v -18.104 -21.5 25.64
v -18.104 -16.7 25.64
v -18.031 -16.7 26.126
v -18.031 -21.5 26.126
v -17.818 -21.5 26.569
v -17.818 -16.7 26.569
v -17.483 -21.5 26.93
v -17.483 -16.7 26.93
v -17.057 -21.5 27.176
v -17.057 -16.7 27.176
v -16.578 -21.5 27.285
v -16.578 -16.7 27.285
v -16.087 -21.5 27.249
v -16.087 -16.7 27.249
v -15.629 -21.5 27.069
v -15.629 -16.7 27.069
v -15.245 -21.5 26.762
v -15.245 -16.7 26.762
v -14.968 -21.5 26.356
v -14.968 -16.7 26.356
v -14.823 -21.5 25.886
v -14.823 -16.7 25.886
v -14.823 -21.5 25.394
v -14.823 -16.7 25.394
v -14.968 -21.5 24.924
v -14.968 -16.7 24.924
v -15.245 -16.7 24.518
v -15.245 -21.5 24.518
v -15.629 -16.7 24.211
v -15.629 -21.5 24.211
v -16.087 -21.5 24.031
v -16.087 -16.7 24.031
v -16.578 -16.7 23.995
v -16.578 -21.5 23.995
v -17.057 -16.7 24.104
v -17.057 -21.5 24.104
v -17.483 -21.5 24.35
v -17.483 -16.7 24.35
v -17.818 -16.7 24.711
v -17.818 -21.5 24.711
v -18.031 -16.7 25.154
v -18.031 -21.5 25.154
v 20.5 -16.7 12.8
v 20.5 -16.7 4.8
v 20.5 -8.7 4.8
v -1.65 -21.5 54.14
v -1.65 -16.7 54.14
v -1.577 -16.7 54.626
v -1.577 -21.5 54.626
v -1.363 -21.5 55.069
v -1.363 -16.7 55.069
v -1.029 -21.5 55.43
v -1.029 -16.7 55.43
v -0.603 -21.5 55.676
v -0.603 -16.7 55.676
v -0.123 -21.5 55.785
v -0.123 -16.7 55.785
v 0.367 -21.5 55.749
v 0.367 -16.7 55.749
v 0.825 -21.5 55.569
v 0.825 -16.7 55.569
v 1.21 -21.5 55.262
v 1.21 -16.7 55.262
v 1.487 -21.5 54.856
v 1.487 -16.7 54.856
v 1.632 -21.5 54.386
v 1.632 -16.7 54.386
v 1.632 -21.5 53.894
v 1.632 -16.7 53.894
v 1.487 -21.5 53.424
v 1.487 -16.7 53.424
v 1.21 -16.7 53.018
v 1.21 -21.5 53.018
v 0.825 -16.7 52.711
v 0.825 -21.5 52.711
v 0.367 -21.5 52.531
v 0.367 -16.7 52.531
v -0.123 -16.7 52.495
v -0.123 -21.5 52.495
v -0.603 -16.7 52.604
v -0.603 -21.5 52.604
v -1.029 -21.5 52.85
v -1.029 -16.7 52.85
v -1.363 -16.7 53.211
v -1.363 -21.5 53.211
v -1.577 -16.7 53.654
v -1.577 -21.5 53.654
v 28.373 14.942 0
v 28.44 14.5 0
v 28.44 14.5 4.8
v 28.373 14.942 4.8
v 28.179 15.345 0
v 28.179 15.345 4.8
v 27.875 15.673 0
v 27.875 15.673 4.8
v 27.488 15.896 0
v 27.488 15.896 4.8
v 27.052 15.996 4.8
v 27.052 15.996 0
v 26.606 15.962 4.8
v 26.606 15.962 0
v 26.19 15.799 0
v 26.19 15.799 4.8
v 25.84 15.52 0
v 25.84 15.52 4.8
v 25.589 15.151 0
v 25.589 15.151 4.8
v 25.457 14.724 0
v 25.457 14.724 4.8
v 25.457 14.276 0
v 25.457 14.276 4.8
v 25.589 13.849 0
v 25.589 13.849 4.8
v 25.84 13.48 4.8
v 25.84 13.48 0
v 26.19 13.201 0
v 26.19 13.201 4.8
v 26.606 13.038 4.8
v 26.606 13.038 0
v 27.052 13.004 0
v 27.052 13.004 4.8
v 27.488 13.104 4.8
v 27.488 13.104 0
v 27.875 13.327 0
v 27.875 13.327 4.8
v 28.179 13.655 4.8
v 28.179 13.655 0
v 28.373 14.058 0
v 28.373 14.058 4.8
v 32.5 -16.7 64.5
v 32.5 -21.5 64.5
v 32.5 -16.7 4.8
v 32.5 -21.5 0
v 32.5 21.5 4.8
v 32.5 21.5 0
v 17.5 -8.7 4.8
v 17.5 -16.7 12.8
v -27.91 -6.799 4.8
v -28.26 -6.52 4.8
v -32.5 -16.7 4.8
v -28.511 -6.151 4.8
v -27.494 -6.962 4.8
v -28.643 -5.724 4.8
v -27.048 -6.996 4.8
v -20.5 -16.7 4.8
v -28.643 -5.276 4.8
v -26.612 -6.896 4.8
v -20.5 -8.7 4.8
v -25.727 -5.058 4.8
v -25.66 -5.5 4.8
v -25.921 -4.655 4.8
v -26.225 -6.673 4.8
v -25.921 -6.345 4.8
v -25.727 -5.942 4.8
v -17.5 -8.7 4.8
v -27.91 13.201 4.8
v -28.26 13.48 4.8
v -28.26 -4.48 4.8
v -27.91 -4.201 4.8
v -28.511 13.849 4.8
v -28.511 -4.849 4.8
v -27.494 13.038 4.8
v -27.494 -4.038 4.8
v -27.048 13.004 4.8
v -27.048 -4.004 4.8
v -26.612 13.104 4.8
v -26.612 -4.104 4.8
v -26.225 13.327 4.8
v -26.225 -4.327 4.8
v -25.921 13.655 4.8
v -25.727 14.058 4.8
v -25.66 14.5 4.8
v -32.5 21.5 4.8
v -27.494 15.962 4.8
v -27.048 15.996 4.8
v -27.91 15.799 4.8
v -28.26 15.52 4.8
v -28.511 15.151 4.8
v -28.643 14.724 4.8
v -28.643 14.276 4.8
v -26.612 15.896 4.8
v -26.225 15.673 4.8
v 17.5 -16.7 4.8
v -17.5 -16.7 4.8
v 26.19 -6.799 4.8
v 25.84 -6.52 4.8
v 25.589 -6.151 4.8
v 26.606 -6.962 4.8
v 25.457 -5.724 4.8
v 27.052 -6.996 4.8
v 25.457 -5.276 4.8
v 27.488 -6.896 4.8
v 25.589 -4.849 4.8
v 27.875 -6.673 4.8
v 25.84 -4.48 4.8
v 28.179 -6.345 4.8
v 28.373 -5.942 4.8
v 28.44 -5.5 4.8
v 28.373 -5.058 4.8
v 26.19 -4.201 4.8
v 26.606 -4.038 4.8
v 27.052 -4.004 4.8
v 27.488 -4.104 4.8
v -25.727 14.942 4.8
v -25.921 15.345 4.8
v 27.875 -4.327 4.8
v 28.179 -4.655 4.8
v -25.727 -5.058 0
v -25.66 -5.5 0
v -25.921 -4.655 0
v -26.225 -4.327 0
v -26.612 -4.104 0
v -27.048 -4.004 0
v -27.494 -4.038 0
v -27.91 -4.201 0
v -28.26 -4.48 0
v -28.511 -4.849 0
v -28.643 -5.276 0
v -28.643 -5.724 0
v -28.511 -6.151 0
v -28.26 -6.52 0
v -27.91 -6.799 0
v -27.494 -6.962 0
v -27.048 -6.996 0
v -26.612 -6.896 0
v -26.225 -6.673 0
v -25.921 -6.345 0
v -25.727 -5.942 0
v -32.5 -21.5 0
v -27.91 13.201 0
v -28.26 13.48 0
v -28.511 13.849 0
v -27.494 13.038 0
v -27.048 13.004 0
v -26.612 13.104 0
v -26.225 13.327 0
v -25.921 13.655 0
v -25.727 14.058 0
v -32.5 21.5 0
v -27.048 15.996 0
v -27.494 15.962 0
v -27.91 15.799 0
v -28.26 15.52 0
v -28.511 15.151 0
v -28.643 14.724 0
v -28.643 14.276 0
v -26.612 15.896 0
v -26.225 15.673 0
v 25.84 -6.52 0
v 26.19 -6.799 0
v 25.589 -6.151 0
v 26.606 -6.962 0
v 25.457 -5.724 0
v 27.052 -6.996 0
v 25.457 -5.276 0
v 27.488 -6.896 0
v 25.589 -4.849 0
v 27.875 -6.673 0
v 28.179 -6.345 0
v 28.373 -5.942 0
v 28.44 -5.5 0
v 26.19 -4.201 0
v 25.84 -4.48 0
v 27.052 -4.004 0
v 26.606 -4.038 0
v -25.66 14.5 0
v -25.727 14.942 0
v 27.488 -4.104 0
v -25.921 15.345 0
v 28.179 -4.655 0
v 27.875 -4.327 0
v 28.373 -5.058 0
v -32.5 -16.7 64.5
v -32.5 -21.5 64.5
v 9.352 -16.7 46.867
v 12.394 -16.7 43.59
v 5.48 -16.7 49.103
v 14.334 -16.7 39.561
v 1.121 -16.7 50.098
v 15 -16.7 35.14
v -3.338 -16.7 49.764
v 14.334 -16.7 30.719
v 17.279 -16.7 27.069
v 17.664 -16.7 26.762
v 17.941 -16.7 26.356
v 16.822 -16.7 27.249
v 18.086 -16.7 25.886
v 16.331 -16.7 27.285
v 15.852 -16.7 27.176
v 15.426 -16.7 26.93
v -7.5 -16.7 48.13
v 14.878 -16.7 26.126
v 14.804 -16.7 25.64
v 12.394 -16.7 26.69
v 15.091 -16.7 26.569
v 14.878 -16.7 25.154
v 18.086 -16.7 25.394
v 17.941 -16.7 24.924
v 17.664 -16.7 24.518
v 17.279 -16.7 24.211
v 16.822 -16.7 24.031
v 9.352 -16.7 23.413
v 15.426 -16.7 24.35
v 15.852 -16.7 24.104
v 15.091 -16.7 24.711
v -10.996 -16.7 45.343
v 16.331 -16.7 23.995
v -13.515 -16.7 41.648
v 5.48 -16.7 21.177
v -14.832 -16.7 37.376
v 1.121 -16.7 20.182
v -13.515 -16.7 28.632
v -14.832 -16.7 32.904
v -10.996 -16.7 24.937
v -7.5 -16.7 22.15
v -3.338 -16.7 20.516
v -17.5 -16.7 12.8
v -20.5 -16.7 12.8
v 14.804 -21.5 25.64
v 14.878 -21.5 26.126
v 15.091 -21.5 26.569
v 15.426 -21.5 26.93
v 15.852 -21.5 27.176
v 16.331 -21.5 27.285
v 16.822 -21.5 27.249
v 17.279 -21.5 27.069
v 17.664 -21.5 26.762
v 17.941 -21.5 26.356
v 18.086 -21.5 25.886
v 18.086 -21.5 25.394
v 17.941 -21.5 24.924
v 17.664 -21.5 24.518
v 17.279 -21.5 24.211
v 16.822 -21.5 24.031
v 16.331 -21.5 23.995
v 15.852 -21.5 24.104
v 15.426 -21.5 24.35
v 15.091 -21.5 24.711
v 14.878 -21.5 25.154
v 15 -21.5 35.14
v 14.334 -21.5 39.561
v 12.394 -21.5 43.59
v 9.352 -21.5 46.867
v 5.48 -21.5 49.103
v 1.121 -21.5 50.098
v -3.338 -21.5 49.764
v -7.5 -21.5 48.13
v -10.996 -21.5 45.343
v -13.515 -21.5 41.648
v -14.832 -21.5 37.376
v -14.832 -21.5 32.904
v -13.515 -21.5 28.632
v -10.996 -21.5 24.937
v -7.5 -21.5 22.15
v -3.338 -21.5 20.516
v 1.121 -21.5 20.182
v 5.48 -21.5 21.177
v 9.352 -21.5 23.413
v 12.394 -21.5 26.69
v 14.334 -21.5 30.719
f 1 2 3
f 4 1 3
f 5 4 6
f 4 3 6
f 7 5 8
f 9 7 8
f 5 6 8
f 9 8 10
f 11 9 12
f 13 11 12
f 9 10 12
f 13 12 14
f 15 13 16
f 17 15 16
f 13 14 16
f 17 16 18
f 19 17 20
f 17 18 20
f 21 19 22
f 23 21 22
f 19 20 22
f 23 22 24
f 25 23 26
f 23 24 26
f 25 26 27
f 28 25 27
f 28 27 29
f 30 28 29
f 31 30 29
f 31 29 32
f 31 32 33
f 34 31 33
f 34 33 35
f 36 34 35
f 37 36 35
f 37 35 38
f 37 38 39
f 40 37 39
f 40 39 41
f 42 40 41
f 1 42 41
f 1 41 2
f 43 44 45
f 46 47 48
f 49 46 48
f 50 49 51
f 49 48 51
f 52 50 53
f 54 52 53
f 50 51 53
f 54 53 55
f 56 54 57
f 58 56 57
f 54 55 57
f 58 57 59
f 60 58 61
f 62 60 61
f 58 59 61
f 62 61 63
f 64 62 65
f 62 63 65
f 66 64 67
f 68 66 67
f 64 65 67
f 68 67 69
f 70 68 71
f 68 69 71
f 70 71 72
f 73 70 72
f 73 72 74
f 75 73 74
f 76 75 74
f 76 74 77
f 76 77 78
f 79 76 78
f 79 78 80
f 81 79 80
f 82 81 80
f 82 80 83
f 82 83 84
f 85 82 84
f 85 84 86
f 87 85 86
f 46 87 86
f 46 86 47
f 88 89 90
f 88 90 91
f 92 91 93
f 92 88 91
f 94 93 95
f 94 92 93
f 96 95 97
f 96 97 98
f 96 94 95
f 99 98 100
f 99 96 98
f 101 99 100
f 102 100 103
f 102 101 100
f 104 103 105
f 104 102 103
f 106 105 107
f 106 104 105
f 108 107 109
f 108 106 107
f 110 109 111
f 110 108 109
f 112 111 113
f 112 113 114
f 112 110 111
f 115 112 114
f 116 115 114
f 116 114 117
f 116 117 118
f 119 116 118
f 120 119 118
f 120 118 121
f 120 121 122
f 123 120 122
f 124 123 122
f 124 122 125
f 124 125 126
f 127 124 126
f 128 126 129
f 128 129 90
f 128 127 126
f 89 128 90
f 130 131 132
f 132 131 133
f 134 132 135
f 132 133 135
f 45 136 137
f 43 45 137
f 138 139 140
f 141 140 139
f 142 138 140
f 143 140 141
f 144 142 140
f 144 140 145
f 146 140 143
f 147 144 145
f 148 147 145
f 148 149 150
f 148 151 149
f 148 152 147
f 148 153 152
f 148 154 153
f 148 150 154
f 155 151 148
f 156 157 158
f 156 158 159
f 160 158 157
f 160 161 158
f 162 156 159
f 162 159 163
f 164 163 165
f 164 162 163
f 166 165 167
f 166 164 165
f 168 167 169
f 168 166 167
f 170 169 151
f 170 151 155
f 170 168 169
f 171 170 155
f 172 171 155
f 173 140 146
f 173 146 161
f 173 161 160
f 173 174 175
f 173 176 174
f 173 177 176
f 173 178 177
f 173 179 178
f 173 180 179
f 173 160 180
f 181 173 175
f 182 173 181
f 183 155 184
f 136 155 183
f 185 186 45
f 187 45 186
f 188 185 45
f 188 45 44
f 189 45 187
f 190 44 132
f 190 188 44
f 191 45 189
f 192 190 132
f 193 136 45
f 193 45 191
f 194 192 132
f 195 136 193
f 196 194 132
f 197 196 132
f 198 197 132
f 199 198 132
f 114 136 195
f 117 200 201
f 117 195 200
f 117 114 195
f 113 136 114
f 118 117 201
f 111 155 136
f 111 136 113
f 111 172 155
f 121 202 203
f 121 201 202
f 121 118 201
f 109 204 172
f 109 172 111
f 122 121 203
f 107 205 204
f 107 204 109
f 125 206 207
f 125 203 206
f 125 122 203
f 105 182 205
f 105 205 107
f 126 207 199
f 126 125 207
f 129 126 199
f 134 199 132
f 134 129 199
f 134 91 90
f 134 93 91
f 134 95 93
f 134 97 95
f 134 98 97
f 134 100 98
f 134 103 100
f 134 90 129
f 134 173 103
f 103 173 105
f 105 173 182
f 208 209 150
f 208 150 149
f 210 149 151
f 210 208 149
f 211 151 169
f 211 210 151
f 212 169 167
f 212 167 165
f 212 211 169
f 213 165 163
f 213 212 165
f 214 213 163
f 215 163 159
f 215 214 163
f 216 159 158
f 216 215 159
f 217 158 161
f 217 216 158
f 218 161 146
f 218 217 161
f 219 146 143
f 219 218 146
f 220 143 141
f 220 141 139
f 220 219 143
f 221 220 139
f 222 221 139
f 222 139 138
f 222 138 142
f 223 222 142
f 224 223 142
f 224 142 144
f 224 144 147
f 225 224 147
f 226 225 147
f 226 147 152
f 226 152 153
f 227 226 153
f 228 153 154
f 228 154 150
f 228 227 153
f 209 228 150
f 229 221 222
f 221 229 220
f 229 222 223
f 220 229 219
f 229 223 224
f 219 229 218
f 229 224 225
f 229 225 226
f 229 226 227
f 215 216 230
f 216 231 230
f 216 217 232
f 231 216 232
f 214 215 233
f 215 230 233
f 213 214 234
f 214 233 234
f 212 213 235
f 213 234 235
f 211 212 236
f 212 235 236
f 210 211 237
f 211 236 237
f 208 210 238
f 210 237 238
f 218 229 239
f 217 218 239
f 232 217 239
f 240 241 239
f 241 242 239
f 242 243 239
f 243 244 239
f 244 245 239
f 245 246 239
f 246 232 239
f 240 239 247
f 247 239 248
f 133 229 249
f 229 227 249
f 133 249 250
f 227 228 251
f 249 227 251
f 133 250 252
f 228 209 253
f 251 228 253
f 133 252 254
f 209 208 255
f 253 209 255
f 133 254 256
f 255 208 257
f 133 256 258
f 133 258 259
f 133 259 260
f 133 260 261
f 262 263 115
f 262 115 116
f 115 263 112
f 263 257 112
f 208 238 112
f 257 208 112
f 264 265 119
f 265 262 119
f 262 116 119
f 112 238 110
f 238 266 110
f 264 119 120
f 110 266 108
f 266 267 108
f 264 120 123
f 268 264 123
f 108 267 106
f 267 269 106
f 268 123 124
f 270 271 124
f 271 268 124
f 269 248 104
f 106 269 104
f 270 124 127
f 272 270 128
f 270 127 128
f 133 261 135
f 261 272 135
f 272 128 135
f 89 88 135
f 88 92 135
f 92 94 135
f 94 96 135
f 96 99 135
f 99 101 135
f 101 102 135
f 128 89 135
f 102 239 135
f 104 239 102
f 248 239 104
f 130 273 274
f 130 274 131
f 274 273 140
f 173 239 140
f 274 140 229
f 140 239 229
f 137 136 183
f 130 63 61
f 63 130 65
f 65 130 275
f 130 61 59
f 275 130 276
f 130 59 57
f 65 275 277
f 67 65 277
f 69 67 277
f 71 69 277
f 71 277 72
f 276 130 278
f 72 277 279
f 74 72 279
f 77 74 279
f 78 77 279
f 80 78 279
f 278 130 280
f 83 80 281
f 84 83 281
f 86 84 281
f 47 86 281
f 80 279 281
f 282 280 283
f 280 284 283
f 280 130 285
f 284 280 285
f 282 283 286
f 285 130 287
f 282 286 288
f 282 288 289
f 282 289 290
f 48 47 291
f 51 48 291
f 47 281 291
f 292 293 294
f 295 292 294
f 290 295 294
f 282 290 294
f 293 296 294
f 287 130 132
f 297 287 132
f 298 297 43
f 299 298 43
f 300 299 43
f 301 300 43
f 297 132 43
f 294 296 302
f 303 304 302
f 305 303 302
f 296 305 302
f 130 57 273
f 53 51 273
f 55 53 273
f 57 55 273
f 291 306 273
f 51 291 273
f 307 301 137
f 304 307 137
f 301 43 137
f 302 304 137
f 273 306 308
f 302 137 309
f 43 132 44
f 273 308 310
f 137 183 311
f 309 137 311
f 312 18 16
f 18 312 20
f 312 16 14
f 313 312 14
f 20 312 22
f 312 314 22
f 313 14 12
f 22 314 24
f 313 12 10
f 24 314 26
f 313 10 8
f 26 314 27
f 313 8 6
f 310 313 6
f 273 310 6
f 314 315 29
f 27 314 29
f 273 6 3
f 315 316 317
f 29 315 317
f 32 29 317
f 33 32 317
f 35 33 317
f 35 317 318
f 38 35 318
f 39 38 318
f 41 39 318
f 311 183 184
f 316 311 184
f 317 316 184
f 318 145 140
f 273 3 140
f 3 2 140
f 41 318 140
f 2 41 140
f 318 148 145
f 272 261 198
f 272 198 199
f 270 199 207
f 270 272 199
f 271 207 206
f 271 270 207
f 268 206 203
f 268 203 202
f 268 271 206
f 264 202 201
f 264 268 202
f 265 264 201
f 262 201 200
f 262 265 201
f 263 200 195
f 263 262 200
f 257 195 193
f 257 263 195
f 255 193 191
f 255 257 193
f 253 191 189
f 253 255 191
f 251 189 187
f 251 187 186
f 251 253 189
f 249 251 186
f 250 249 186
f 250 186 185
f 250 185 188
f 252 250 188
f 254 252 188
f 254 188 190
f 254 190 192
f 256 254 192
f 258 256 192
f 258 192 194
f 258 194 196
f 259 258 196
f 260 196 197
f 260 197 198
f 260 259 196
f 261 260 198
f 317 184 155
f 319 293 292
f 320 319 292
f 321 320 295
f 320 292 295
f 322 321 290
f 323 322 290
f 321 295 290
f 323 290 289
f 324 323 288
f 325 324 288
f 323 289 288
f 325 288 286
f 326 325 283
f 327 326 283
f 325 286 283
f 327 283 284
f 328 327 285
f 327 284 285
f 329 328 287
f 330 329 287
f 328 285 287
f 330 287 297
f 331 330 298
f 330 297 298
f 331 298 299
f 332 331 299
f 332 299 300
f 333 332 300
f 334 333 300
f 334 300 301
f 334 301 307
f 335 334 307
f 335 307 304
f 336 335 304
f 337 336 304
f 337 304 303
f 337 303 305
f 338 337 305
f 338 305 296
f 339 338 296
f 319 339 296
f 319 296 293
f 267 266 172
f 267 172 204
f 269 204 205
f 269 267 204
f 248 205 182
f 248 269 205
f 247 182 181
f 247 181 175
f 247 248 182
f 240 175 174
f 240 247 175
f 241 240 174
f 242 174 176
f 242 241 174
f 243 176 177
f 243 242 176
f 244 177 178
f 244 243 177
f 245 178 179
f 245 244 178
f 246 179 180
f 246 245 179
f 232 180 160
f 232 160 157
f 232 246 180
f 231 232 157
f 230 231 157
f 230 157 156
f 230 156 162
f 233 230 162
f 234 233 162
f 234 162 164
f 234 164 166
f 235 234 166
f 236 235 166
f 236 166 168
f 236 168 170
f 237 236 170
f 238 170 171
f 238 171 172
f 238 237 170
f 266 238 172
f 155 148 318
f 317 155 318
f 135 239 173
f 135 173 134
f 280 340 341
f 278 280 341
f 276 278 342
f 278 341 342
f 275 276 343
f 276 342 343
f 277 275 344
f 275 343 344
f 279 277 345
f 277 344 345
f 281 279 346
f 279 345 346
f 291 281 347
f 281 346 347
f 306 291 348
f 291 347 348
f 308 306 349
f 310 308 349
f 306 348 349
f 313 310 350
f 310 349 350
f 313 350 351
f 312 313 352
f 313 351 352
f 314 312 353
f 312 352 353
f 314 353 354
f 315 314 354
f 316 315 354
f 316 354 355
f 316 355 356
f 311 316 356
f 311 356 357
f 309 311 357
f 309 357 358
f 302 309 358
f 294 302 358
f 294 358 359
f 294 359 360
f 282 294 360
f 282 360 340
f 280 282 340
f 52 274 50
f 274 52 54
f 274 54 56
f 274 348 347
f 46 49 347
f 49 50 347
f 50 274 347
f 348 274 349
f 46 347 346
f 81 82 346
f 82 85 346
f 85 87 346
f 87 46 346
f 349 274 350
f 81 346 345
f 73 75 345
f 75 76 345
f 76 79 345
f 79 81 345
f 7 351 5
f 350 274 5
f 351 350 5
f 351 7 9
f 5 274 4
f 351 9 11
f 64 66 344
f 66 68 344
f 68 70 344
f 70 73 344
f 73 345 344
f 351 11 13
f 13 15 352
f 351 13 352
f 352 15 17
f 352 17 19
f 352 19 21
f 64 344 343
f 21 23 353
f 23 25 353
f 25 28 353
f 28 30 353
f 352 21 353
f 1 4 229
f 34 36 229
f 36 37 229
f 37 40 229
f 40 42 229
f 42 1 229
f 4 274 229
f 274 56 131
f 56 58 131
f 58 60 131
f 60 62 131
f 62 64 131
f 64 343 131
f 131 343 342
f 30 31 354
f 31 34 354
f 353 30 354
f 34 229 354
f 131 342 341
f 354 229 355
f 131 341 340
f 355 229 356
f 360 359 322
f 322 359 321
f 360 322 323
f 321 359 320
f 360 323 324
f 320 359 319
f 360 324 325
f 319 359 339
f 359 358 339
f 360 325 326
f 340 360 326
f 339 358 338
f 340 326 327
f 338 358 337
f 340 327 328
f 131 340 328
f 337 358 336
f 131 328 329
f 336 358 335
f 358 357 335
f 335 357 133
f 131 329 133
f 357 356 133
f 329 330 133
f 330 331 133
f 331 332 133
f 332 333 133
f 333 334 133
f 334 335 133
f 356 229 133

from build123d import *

# Parameters (mm, degrees)
F0_W     = 65
F0_H     = 43
F0_R     = 1.5
F1_DEPTH = 4.8
F3_DEPTH = 59.7
F5_DEPTH = 53.001
F6_R     = 15
F7_DEPTH = 43.001
F8_D     = 3.3


with BuildPart() as f1:
    # F0 (on Top) → F1 (new body)
    with BuildSketch(Plane.XY):
        Rectangle(F0_W, F0_H)
        with Locations((-27.16, -5.5)):
            Circle(F0_R, mode=Mode.SUBTRACT)
        with Locations((26.94, -5.5)):
            Circle(F0_R, mode=Mode.SUBTRACT)
        with Locations((-27.16, 14.5)):
            Circle(F0_R, mode=Mode.SUBTRACT)
        with Locations((26.94, 14.5)):
            Circle(F0_R, mode=Mode.SUBTRACT)
    extrude(amount=F1_DEPTH)

    # F2 (on face) → F3 (join)
    with BuildSketch(Plane.XY.offset(4.8)):
        Polygon((-20.5, -16.7), (-32.5, -16.7), (-32.5, -21.5), (32.5, -21.5), (32.5, -16.7), (20.5, -16.7), (20.5, -8.7), (17.5, -8.7), (17.5, -16.7), (-17.5, -16.7), (-17.5, -8.7), (-20.5, -8.7), align=None)
    extrude(amount=F3_DEPTH)

    # F4 (on face) → F5 (cut, through all)
    with BuildSketch(Plane(origin=(-20.5, 0, 0), x_dir=(0, -1, 0), z_dir=(-1, 0, 0))):
        Polygon((16.7, 12.8), (16.7, 64.5), (8.7, 64.5), (8.7, 4.8), align=None)
    extrude(amount=-F5_DEPTH, mode=Mode.SUBTRACT)

    # F6 (on face) → F7 (cut, through all)
    with BuildSketch(Plane.XZ.offset(21.5)):
        with Locations((0, 35.14)):
            Circle(F6_R)
    extrude(amount=-F7_DEPTH, mode=Mode.SUBTRACT)

    # F8 (through all)
    with Locations(Plane.XZ.offset(21.5)):
        with Locations((0, 54.14), (-16.454483, 25.64), (16.454483, 25.64)):
            Hole(F8_D / 2)


solid = f1.part
